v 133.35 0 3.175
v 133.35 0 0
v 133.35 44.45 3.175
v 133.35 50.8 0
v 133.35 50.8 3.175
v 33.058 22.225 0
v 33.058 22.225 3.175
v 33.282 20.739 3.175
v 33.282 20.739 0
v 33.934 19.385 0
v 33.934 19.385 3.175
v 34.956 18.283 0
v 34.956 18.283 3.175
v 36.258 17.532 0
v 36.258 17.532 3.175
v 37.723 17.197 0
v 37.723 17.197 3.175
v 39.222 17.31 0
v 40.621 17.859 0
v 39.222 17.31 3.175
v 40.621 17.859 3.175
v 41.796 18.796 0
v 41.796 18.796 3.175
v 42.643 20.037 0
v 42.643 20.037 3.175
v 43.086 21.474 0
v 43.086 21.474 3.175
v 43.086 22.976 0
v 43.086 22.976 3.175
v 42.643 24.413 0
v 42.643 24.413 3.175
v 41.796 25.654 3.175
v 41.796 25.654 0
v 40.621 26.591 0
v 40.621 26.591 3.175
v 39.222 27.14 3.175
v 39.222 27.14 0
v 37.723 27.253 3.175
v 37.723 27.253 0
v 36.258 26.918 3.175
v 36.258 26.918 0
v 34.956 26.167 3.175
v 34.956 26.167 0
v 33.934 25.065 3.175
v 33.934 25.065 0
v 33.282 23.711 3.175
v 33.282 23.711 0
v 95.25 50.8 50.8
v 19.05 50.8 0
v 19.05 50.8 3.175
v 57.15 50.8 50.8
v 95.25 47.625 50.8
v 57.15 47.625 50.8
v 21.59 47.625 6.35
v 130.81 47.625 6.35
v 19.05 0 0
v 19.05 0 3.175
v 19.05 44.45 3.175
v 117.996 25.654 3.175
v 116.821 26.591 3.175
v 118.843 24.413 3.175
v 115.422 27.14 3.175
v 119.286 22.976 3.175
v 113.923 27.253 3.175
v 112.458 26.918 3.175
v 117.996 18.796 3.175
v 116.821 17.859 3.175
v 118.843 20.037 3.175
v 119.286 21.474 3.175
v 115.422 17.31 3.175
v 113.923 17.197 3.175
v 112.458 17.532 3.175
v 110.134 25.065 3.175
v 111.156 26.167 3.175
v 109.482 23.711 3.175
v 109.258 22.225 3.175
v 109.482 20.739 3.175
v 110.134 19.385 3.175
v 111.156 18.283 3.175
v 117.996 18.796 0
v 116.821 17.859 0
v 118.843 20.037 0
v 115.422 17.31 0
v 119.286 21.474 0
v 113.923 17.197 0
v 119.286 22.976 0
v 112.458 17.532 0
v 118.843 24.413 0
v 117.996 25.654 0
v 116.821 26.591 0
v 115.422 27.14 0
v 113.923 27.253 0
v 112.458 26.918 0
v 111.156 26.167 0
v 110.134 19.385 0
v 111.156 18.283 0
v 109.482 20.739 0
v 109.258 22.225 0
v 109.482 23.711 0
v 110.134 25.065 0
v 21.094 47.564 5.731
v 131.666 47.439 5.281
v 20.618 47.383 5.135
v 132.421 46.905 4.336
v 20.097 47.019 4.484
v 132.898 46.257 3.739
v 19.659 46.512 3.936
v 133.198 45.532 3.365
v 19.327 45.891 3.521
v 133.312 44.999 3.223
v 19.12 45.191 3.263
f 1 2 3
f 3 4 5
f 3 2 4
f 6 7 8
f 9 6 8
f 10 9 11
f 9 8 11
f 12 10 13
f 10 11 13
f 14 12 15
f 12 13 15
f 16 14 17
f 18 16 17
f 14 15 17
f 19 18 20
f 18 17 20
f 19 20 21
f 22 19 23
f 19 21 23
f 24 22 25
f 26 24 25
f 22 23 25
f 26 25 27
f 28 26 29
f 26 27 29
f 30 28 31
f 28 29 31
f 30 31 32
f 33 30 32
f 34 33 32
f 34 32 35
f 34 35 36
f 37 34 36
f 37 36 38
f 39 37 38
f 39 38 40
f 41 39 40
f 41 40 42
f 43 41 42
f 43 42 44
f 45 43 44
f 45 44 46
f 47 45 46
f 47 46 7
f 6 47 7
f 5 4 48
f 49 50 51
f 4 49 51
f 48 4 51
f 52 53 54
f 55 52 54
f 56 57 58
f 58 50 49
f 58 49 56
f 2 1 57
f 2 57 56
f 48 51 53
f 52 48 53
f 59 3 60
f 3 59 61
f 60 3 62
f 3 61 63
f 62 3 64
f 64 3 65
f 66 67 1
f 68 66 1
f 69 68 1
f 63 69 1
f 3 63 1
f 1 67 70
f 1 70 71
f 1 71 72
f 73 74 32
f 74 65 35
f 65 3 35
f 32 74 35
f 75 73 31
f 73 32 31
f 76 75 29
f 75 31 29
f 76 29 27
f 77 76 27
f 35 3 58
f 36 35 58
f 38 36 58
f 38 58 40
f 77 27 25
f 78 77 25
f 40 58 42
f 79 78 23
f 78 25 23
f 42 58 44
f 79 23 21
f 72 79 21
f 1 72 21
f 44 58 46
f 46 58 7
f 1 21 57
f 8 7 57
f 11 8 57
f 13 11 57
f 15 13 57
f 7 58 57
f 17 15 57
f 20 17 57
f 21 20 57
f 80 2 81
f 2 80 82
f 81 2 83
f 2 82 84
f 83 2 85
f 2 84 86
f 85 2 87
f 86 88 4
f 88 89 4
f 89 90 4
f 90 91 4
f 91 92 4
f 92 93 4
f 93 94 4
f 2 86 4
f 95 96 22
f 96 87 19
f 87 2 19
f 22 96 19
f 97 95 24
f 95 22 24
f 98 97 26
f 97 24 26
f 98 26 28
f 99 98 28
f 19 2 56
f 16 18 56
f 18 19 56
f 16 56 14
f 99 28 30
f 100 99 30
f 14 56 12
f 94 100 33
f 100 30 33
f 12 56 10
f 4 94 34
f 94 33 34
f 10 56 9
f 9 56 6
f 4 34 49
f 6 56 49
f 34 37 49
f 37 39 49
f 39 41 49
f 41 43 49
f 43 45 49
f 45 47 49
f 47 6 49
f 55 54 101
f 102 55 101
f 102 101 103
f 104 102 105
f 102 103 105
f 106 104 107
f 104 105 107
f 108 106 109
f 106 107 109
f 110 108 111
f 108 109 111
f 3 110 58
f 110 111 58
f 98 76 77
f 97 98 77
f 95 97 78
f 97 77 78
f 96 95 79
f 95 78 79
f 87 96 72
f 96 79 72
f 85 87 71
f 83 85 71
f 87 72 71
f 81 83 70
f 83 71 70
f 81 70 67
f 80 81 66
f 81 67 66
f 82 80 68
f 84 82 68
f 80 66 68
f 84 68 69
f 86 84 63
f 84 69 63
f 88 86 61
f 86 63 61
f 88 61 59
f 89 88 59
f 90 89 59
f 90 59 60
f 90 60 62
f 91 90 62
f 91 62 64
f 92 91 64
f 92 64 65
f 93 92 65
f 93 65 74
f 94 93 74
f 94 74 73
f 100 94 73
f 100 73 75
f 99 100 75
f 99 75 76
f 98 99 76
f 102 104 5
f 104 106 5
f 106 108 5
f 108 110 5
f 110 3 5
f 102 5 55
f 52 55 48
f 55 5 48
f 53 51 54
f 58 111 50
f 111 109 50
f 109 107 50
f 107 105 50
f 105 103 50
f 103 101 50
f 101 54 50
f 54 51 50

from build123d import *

# Parameters (mm, degrees)
F1_DEPTH = 152.4
F3_DEPTH = 50.801
F5_DEPTH = 25.4


with BuildPart() as f1:
    # F0 (on Right) → F1 (new body)
    with BuildSketch(Plane.YZ):
        with BuildLine():
            Line((0, 3.175), (0, 0))
            Line((0, 0), (50.8, 0))
            Line((50.8, 0), (50.8, 50.8))
            Line((50.8, 50.8), (47.625, 50.8))
            Line((47.625, 50.8), (47.625, 6.35))
            ThreePointArc((47.625, 6.35), (46.695064, 4.104936), (44.45, 3.175))
            Line((44.45, 3.175), (0, 3.175))
        make_face()
    extrude(amount=F1_DEPTH)

    # F2 (on face) → F3 (cut, through all)
    with BuildSketch(Plane(origin=(0, 50.8, 0), x_dir=(-1, 0, 0), z_dir=(0, 1, 0))):
        Polygon((0, 50.8), (-57.15, 50.8), (-19.05, 3.175), (-19.05, 0), (0, 0), align=None)
        Polygon((-133.35, 3.175), (-95.25, 50.8), (-152.4, 50.8), (-152.4, 0), (-133.35, 0), align=None)
    extrude(amount=-F3_DEPTH, mode=Mode.SUBTRACT)

    # F4 (on face) → F5 (cut)
    with BuildSketch(Plane.XY.offset(3.175)):
        with BuildLine():
            ThreePointArc((43.1419, 22.225), (38.1, 27.2669), (33.0581, 22.225))
            Line((33.0581, 22.225), (43.1419, 22.225))
        make_face()
        with BuildLine():
            Line((43.1419, 22.225), (33.0581, 22.225))
            ThreePointArc((33.0581, 22.225), (38.1, 17.1831), (43.1419, 22.225))
        make_face()
        with BuildLine():
            Line((109.2581, 22.225), (119.3419, 22.225))
            ThreePointArc((119.3419, 22.225), (114.3, 27.2669), (109.2581, 22.225))
        make_face()
        with BuildLine():
            ThreePointArc((109.2581, 22.225), (114.3, 17.1831), (119.3419, 22.225))
            Line((119.3419, 22.225), (109.2581, 22.225))
        make_face()
    extrude(amount=-F5_DEPTH, mode=Mode.SUBTRACT)


solid = f1.part
